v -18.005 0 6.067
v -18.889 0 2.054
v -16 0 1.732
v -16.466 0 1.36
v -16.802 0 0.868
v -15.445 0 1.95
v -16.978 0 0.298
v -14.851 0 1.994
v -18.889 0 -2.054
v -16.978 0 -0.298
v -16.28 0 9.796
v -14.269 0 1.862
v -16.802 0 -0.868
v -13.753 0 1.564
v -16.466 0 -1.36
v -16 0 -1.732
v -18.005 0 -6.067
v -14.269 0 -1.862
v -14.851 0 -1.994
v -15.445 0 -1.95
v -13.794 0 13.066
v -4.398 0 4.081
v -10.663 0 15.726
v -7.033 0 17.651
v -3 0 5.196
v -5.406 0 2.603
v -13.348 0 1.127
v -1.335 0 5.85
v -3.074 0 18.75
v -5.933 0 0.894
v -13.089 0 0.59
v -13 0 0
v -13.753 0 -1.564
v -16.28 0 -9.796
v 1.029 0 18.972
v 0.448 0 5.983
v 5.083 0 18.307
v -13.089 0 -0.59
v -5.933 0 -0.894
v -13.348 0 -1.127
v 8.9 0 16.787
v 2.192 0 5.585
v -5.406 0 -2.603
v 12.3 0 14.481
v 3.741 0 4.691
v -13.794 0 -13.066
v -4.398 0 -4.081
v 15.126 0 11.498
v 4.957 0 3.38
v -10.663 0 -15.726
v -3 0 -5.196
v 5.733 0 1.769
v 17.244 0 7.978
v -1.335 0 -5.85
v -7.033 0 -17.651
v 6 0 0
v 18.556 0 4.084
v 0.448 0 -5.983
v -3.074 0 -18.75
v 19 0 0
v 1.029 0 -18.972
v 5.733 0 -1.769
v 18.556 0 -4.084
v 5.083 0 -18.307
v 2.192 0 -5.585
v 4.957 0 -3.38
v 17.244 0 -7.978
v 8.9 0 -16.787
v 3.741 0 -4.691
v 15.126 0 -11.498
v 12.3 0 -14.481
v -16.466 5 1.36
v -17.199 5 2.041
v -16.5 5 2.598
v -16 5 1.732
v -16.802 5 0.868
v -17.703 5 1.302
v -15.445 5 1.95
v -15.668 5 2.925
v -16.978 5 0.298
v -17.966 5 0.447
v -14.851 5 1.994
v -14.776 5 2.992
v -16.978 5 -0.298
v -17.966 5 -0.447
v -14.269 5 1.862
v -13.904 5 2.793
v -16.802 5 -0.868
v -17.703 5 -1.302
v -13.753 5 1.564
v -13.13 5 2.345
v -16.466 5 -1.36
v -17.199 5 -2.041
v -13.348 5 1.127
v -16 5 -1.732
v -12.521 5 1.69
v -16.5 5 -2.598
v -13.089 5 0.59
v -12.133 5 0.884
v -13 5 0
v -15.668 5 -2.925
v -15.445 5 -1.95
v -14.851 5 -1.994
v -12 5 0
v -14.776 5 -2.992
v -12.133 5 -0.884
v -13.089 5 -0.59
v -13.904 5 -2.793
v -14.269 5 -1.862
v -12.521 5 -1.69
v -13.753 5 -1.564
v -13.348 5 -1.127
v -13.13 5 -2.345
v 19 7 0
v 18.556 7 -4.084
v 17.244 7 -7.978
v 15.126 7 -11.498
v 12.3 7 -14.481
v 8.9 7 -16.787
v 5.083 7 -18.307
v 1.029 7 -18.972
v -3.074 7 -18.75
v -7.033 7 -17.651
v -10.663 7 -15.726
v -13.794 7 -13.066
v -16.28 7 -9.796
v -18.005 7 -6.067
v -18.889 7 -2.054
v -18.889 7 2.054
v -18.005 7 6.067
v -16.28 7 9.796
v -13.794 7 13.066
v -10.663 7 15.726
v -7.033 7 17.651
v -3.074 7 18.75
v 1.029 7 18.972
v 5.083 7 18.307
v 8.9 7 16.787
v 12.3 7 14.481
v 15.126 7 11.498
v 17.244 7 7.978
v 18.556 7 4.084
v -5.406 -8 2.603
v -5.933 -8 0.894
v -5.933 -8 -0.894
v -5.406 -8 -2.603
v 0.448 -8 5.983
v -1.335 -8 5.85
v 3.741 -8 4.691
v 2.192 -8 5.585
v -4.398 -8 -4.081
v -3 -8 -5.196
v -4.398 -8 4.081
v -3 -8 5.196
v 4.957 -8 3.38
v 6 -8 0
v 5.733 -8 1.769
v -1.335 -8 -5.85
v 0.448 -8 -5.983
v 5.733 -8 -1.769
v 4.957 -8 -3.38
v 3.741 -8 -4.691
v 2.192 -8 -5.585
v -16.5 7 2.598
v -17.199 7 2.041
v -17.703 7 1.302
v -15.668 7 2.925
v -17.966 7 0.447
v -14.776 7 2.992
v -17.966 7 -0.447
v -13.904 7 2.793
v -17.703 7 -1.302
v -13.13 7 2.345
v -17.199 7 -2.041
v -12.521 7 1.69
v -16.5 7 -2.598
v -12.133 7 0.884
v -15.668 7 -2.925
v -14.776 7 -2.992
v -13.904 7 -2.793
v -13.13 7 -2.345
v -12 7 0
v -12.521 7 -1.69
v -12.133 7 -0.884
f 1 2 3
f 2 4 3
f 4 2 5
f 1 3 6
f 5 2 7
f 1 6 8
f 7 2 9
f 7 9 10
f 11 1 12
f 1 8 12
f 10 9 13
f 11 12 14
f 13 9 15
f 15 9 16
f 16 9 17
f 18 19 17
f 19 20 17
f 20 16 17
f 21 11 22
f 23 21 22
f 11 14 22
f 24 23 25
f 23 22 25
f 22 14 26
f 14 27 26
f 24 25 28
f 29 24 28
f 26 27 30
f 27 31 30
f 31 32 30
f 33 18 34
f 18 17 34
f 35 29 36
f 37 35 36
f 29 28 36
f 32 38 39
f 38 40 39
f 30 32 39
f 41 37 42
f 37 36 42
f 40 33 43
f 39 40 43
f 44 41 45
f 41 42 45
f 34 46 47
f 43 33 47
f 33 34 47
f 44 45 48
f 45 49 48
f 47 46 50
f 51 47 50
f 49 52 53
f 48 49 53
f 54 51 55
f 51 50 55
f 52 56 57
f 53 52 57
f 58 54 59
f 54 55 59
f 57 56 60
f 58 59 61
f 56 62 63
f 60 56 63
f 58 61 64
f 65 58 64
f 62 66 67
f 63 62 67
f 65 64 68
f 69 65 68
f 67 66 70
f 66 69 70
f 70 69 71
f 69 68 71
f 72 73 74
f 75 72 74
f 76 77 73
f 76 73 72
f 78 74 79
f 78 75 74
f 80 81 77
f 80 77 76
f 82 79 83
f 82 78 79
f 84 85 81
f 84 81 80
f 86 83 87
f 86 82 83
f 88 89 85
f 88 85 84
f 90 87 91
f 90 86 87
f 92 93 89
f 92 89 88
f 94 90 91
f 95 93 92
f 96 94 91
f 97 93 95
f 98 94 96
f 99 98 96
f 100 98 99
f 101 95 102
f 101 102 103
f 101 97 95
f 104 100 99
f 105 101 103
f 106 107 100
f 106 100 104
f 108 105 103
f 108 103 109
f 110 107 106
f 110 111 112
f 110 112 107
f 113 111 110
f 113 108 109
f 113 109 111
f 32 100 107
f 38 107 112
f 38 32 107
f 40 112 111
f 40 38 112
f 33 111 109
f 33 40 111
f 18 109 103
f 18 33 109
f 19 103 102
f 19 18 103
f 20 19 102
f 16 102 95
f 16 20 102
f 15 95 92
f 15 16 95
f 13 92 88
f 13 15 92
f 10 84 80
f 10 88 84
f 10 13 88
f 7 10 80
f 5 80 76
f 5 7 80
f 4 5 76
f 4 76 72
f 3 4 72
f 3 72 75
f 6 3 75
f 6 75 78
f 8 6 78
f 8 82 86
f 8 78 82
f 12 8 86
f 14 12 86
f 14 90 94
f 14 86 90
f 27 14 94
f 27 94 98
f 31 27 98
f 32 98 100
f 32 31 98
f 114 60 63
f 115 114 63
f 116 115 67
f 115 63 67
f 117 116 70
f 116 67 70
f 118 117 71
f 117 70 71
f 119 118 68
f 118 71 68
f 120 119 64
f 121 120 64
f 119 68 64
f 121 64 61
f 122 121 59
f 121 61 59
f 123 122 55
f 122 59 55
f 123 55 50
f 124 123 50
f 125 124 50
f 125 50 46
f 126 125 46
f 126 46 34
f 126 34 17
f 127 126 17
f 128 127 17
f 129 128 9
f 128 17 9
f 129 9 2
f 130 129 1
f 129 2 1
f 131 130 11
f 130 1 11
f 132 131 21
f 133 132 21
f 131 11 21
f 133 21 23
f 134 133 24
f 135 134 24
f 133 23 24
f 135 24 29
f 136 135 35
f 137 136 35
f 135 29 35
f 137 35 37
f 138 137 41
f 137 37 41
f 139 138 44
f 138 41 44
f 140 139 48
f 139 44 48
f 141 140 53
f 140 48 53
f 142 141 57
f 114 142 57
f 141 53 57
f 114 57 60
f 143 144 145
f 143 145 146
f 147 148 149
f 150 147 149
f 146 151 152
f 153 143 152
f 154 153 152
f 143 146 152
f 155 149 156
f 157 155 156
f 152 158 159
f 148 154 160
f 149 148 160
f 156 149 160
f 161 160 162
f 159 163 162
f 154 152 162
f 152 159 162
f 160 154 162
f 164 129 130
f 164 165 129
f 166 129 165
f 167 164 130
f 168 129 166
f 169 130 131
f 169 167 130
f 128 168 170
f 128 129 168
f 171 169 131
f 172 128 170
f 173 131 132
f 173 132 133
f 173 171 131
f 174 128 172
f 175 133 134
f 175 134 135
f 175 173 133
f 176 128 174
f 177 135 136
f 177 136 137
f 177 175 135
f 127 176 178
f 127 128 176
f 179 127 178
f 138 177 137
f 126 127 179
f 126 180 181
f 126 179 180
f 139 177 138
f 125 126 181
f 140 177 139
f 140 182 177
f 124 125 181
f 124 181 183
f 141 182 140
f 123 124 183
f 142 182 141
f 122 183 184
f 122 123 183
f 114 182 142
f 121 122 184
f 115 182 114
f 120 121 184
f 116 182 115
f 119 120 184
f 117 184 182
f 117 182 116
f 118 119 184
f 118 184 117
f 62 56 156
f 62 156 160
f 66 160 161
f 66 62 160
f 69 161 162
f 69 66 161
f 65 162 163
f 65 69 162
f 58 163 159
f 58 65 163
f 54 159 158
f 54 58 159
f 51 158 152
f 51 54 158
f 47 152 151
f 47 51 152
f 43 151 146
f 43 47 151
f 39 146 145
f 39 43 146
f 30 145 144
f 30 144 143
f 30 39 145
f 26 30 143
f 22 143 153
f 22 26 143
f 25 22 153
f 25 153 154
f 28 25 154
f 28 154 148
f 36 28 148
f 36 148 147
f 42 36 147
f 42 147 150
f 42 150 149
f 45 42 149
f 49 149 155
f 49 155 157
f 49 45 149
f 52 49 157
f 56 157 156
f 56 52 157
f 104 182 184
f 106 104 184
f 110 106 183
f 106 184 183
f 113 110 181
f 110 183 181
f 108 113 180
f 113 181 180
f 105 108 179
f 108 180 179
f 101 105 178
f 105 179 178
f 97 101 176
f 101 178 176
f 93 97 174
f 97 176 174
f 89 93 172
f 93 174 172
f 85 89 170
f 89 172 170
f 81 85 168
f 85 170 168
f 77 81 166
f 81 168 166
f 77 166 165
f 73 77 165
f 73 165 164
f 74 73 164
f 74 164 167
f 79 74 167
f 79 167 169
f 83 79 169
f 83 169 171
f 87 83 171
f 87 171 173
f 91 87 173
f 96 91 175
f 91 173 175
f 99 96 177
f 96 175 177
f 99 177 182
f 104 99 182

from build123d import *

# Parameters (mm, degrees)
CROQUIS2_R              = 19
SALIENTE_EXTRUIR1_DEPTH = 7
CROQUIS2_4_R            = 6
SALIENTE_EXTRUIR2_DEPTH = 8
CROQUIS2_5_R            = 2
CORTAR_EXTRUIR2_DEPTH   = 8
CROQUIS5_R              = 3
CORTAR_EXTRUIR3_DEPTH   = 2


with BuildPart() as part:
    # Croquis2 → Saliente-Extruir1 (new body)
    with BuildSketch(Plane(origin=(0, 0, 0), x_dir=(1, 0, 0), z_dir=(0, 1, 0))):
        Circle(CROQUIS2_R)
    extrude(amount=SALIENTE_EXTRUIR1_DEPTH)

    # Croquis2<4> → Saliente-Extruir2 (add)
    with BuildSketch(Plane(origin=(0, 0, 0), x_dir=(1, 0, 0), z_dir=(0, 1, 0))):
        Circle(CROQUIS2_4_R)
    extrude(amount=-SALIENTE_EXTRUIR2_DEPTH)

    # Croquis2<5> → Cortar-Extruir2 (cut, through all)
    with BuildSketch(Plane(origin=(0, 0, 0), x_dir=(1, 0, 0), z_dir=(0, 1, 0))):
        with Locations((-15, 0)):
            Circle(CROQUIS2_5_R)
    extrude(amount=CORTAR_EXTRUIR2_DEPTH, mode=Mode.SUBTRACT)

    # Croquis5 → Cortar-Extruir3 (cut)
    with BuildSketch(Plane(origin=(0, 7, 0), x_dir=(1, 0, 0), z_dir=(0, 1, 0))):
        with Locations((-15, 0)):
            Circle(CROQUIS5_R)
    extrude(amount=-CORTAR_EXTRUIR3_DEPTH, mode=Mode.SUBTRACT)


solid = part.part
